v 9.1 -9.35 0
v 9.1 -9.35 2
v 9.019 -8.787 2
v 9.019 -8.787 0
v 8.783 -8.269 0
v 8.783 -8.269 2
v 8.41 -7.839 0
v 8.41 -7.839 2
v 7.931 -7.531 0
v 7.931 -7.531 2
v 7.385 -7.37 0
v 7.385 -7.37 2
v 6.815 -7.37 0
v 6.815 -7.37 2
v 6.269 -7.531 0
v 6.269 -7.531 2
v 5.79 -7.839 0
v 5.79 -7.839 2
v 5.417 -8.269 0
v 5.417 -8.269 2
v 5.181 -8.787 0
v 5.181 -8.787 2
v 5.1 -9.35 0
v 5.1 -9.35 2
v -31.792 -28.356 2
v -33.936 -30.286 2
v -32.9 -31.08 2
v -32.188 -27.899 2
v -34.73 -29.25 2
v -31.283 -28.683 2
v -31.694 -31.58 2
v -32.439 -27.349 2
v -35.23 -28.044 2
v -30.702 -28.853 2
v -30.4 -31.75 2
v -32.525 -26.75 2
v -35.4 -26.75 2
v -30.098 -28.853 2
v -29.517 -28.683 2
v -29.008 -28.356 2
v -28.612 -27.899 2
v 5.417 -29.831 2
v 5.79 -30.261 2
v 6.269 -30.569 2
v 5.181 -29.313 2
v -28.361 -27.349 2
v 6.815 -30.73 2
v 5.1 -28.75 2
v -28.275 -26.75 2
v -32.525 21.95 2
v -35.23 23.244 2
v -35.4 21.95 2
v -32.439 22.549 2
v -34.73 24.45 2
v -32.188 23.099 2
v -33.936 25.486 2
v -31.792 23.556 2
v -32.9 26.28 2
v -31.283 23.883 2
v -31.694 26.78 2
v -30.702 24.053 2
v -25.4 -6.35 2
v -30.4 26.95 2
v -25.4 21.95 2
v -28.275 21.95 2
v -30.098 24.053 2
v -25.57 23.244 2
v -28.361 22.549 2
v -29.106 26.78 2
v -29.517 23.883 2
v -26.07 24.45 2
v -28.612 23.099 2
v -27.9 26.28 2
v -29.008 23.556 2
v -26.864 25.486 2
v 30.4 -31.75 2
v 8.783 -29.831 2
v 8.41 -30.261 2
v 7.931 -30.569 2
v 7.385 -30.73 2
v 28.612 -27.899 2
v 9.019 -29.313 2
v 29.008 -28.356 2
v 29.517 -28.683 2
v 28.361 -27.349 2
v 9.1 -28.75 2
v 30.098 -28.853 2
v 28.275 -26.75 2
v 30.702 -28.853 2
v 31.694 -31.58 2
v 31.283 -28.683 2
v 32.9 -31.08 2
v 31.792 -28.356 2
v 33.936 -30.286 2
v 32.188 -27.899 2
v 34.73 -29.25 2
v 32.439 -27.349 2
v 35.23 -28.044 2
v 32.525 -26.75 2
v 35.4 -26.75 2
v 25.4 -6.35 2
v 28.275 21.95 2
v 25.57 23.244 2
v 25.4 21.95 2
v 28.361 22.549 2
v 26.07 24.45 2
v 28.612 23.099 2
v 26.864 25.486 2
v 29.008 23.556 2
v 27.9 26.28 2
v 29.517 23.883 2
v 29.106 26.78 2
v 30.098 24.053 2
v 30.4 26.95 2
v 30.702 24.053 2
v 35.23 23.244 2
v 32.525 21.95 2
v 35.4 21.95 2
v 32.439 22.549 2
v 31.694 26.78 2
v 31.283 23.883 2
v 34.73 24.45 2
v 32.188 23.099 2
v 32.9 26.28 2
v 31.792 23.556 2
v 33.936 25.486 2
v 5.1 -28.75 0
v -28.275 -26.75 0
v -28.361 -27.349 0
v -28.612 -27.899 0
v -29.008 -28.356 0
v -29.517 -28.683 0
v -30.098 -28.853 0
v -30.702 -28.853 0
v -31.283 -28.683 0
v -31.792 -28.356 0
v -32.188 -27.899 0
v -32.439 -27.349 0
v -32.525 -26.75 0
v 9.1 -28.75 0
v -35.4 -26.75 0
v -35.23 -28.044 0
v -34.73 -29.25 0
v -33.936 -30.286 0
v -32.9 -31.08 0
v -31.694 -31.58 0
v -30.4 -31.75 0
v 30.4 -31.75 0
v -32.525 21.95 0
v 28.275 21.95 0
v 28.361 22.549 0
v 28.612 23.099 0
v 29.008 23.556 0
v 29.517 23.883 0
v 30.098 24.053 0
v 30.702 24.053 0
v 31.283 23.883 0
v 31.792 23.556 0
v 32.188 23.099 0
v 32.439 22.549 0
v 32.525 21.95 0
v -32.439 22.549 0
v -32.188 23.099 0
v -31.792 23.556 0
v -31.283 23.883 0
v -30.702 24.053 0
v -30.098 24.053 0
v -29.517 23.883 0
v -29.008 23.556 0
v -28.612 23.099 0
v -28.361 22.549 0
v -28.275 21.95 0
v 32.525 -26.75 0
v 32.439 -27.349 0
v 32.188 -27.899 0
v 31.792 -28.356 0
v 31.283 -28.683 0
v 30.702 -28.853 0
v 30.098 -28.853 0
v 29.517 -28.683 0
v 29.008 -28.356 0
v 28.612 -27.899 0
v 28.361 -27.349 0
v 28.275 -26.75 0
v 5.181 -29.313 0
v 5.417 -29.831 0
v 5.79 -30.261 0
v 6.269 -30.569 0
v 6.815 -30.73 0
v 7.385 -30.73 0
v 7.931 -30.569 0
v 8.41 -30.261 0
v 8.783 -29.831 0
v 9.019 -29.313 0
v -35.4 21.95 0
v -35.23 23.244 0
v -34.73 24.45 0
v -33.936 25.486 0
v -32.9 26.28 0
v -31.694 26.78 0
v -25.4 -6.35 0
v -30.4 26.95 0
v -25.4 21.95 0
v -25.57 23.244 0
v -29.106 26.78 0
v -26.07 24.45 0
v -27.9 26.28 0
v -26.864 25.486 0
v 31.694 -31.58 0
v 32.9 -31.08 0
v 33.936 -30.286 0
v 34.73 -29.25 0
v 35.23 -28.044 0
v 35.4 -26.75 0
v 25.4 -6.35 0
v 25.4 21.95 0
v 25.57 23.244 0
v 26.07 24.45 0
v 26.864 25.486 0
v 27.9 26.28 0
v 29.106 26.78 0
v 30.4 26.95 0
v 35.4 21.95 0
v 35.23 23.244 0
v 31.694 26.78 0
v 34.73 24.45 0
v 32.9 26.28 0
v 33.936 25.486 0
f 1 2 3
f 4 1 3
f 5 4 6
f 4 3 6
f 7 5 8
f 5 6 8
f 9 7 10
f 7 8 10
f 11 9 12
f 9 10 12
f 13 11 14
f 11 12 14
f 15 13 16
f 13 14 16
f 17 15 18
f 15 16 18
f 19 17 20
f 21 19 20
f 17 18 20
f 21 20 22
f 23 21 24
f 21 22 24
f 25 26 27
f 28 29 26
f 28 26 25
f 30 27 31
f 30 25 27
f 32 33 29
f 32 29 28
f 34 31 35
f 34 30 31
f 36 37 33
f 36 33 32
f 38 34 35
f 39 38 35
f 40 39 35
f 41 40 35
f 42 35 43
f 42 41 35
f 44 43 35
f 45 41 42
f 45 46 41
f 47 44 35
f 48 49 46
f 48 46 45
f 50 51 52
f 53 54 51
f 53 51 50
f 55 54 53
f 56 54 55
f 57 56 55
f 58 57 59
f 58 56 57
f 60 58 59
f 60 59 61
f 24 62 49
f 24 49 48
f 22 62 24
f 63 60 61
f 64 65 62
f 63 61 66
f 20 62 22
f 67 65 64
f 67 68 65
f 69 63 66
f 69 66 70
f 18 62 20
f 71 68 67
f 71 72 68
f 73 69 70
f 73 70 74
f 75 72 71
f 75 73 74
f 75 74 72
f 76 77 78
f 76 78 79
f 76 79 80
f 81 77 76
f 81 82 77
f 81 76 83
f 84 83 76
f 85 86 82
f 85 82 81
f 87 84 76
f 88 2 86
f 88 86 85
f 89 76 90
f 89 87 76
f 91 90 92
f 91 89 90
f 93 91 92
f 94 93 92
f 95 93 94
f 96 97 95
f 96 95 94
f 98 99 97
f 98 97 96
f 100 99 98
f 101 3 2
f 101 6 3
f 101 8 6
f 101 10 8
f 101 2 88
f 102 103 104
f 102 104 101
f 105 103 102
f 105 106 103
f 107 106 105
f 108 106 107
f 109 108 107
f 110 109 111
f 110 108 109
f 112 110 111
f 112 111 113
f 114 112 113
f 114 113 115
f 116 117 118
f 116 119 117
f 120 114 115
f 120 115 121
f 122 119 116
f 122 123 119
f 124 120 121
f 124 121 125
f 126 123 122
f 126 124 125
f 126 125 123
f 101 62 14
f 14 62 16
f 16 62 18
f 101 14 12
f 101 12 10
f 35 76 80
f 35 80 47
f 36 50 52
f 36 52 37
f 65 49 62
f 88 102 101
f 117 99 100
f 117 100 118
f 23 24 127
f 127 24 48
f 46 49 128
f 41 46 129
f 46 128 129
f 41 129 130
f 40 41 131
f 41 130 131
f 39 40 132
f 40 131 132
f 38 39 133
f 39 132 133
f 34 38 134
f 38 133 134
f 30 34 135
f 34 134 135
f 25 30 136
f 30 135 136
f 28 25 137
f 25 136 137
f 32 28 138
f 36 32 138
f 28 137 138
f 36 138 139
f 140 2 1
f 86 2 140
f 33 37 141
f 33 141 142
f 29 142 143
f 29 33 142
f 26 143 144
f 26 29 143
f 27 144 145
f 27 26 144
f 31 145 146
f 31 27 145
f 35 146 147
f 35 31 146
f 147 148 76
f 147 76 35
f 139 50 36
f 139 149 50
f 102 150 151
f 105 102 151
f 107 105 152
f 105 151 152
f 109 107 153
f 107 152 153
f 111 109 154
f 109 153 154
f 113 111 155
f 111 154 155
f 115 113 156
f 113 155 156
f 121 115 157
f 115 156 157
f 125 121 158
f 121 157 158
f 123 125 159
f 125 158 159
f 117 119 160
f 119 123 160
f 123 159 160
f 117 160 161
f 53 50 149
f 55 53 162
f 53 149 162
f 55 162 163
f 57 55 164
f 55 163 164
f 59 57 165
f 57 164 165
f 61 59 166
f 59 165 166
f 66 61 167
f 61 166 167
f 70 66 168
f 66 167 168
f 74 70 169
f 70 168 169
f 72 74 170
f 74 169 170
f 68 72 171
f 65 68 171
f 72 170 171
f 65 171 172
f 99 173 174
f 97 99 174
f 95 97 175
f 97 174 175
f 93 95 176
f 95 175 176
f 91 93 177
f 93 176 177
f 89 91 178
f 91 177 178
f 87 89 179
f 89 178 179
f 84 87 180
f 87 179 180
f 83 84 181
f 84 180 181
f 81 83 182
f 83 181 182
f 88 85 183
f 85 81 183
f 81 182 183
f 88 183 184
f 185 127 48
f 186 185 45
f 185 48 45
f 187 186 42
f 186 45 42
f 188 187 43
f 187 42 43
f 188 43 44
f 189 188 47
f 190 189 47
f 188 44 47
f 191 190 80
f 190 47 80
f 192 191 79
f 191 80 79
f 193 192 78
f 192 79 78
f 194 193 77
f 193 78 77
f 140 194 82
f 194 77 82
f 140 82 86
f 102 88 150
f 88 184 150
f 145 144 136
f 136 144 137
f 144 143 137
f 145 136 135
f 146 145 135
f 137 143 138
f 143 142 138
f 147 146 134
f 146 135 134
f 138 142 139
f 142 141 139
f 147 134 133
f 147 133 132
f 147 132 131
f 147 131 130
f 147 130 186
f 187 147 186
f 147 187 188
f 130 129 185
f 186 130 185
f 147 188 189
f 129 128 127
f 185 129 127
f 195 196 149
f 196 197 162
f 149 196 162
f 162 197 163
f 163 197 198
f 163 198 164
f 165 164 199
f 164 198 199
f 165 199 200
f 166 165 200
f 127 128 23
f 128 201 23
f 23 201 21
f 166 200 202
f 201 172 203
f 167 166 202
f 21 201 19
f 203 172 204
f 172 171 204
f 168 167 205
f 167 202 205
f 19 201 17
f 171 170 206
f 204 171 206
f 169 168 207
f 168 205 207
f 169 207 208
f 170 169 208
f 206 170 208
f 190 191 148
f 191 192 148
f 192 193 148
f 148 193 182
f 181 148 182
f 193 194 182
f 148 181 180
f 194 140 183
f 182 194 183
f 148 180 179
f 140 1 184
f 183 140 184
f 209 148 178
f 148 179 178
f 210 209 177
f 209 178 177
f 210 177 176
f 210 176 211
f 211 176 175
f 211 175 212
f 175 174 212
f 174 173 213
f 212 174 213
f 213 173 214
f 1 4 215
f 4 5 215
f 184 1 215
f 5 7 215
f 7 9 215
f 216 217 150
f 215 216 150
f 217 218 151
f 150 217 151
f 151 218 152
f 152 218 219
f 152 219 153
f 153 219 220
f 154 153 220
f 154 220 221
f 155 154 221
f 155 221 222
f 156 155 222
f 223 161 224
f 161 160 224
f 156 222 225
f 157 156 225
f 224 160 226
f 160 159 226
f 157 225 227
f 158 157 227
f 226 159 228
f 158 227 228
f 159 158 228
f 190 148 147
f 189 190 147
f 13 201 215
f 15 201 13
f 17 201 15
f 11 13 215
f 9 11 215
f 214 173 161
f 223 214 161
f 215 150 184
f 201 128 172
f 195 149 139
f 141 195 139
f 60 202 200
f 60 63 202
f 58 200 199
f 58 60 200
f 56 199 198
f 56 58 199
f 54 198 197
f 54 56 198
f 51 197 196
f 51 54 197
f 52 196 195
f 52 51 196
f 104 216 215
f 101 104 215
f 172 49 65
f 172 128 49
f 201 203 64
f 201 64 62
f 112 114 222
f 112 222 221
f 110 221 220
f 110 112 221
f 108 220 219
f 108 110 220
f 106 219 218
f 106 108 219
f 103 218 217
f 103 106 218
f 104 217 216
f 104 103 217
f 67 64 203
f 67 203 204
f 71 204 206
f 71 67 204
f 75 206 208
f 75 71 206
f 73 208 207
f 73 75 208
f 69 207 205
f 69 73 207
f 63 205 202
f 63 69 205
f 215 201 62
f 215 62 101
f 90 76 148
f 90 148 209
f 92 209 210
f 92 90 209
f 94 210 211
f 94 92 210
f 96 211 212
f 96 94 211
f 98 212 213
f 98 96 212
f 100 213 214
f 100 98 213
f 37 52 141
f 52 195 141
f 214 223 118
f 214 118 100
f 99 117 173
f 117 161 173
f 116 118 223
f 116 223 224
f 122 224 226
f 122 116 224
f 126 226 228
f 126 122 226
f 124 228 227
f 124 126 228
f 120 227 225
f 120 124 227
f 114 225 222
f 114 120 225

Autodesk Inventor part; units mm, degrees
ref_plane "YZ Plane" through (0, 0, 0) normal (1, 0, 0) x (0, 1, 0)
ref_plane "XZ Plane" through (0, 0, 0) normal (0, 1, 0) x (-1, 0, 0)
ref_plane "XY Plane" through (0, 0, 0) normal (0, 0, 1) x (1, 0, 0)
sketch "Sketch1" plane through (0, 0, 0) normal (0, 0, 1) x (1, 0, 0)
  line L0 (0, -6.35) -> (25.4, -6.35)
  line L1 (25.4, -6.35) -> (25.4, -31.75)
  line L2 (25.4, -31.75) -> (-25.4, -31.75)
  line L3 (-25.4, -31.75) -> (-25.4, -6.35)
  line L4 (-25.4, -6.35) -> (0, -6.35)
  point P0 (-6.35, -6.35)
  point P1 (6.35, -6.35)
  dimension "d7" = 25.4
  dimension "d8" = 25.4
  dimension "d9" = 50.8
extrude "Extrusion1" add sketch "Sketch1" along normal blind 2
sketch "Sketch2" plane through (0, 0, 2) normal (0, 0, 1) x (1, 0, 0)
  line L0 (-25.4, -6.35) -> (-25.4, -31.75) projected
  line L1 (-25.4, -31.75) -> (7.1, -31.75)
  line L2 (-25.4, -31.75) -> (25.4, -31.75) projected
  line L3 (7.1, -31.75) -> (7.1, -30.75)
  line L4 (7.1, -30.75) -> (7.1, -28.75)
  circle A0 centre (7.1, -28.75) radius 2
  circle A1 centre (7.1, -9.35) radius 2
  line L5 (5.1, -9.35) -> (5.1, -28.75)
  line L6 (9.1, -9.35) -> (9.1, -28.75)
  point P0 (0, 0)
  dimension "d10" = 32.5
  dimension "d11" = 1
  dimension "d12" = 2
  dimension "d13" = 4
  dimension "d15" = 4
extrude "Extrusion2" cut sketch "Sketch2" against normal blind 2.54
sketch "Sketch3" plane through (0, 0, 0) normal (0, 0, 1) x (1, 0, 0)
  line L0 (-25.4, -6.35) -> (-25.4, -31.75) projected
  line L1 (-25.4, -6.35) -> (-25.4, -31.75)
  line L2 (-25.4, -31.75) -> (-35.4, -31.75)
  line L3 (-29.4, 26.95) -> (-35.4, 26.95)
  line L4 (-35.4, 26.95) -> (-35.4, -31.75)
  line L5 (-29.4, 26.95) -> (-25.4, 26.95)
  line L6 (-25.4, 26.95) -> (-25.4, -6.35)
  line L7 (25.4, -6.35) -> (-25.4, -6.35) projected
  line L8 (0, -6.35) -> (0, -31.75)
  line L9 (-25.4, -31.75) -> (25.4, -31.75) projected
  line L10 (25.4, -6.35) -> (25.4, -31.75)
  line L11 (25.4, -6.35) -> (25.4, -31.75)
  line L12 (25.4, -31.75) -> (35.4, -31.75)
  line L13 (29.4, 26.95) -> (35.4, 26.95)
  line L14 (35.4, 26.95) -> (35.4, -31.75)
  line L15 (29.4, 26.95) -> (25.4, 26.95)
  line L16 (25.4, 26.95) -> (25.4, -6.35)
  line L17 (-30.4, -31.75) -> (-30.4, -26.75)
  arc A0 (-32.525, -26.75) -> (-28.275, -26.75) centre (-30.4, -26.75) ccw
  line L18 (-30.4, 26.95) -> (-30.4, 21.95)
  arc A1 (-28.275, 21.95) -> (-32.525, 21.95) centre (-30.4, 21.95) ccw
  line L19 (-32.525, 21.95) -> (-32.525, -26.75)
  line L20 (-28.275, -26.75) -> (-28.275, 21.95)
  arc A2 (28.275, -26.75) -> (32.525, -26.75) centre (30.4, -26.75) ccw
  arc A3 (32.525, 21.95) -> (28.275, 21.95) centre (30.4, 21.95) ccw
  line L21 (32.525, 21.95) -> (32.525, -26.75)
  line L22 (28.275, -26.75) -> (28.275, 21.95)
  point P0 (0, 0)
  dimension "d26" = 10
  dimension "d36" = 5
  dimension "d37" = 4.25
  dimension "d38" = 5
  dimension "d39" = 4.25
extrude "Extrusion3" add sketch "Sketch3" along normal blind 2 contours L0 L2 L17 A0 L20 A1 L18 L3 L5 L6 | L2 L4 L3 L18 A1 L19 A0 L17 | L16 L15 L13 L14 L12 L10
fillet "Fillet1" radius 5 6 edges at (-35.4, 26.95, 1) (-25.4, 26.95, 1) (-35.4, -31.75, 1) (25.4, 26.95, 1) (35.4, 26.95, 1) (35.4, -31.75, 1)
properties part number "Ultrasonic Sensor"
